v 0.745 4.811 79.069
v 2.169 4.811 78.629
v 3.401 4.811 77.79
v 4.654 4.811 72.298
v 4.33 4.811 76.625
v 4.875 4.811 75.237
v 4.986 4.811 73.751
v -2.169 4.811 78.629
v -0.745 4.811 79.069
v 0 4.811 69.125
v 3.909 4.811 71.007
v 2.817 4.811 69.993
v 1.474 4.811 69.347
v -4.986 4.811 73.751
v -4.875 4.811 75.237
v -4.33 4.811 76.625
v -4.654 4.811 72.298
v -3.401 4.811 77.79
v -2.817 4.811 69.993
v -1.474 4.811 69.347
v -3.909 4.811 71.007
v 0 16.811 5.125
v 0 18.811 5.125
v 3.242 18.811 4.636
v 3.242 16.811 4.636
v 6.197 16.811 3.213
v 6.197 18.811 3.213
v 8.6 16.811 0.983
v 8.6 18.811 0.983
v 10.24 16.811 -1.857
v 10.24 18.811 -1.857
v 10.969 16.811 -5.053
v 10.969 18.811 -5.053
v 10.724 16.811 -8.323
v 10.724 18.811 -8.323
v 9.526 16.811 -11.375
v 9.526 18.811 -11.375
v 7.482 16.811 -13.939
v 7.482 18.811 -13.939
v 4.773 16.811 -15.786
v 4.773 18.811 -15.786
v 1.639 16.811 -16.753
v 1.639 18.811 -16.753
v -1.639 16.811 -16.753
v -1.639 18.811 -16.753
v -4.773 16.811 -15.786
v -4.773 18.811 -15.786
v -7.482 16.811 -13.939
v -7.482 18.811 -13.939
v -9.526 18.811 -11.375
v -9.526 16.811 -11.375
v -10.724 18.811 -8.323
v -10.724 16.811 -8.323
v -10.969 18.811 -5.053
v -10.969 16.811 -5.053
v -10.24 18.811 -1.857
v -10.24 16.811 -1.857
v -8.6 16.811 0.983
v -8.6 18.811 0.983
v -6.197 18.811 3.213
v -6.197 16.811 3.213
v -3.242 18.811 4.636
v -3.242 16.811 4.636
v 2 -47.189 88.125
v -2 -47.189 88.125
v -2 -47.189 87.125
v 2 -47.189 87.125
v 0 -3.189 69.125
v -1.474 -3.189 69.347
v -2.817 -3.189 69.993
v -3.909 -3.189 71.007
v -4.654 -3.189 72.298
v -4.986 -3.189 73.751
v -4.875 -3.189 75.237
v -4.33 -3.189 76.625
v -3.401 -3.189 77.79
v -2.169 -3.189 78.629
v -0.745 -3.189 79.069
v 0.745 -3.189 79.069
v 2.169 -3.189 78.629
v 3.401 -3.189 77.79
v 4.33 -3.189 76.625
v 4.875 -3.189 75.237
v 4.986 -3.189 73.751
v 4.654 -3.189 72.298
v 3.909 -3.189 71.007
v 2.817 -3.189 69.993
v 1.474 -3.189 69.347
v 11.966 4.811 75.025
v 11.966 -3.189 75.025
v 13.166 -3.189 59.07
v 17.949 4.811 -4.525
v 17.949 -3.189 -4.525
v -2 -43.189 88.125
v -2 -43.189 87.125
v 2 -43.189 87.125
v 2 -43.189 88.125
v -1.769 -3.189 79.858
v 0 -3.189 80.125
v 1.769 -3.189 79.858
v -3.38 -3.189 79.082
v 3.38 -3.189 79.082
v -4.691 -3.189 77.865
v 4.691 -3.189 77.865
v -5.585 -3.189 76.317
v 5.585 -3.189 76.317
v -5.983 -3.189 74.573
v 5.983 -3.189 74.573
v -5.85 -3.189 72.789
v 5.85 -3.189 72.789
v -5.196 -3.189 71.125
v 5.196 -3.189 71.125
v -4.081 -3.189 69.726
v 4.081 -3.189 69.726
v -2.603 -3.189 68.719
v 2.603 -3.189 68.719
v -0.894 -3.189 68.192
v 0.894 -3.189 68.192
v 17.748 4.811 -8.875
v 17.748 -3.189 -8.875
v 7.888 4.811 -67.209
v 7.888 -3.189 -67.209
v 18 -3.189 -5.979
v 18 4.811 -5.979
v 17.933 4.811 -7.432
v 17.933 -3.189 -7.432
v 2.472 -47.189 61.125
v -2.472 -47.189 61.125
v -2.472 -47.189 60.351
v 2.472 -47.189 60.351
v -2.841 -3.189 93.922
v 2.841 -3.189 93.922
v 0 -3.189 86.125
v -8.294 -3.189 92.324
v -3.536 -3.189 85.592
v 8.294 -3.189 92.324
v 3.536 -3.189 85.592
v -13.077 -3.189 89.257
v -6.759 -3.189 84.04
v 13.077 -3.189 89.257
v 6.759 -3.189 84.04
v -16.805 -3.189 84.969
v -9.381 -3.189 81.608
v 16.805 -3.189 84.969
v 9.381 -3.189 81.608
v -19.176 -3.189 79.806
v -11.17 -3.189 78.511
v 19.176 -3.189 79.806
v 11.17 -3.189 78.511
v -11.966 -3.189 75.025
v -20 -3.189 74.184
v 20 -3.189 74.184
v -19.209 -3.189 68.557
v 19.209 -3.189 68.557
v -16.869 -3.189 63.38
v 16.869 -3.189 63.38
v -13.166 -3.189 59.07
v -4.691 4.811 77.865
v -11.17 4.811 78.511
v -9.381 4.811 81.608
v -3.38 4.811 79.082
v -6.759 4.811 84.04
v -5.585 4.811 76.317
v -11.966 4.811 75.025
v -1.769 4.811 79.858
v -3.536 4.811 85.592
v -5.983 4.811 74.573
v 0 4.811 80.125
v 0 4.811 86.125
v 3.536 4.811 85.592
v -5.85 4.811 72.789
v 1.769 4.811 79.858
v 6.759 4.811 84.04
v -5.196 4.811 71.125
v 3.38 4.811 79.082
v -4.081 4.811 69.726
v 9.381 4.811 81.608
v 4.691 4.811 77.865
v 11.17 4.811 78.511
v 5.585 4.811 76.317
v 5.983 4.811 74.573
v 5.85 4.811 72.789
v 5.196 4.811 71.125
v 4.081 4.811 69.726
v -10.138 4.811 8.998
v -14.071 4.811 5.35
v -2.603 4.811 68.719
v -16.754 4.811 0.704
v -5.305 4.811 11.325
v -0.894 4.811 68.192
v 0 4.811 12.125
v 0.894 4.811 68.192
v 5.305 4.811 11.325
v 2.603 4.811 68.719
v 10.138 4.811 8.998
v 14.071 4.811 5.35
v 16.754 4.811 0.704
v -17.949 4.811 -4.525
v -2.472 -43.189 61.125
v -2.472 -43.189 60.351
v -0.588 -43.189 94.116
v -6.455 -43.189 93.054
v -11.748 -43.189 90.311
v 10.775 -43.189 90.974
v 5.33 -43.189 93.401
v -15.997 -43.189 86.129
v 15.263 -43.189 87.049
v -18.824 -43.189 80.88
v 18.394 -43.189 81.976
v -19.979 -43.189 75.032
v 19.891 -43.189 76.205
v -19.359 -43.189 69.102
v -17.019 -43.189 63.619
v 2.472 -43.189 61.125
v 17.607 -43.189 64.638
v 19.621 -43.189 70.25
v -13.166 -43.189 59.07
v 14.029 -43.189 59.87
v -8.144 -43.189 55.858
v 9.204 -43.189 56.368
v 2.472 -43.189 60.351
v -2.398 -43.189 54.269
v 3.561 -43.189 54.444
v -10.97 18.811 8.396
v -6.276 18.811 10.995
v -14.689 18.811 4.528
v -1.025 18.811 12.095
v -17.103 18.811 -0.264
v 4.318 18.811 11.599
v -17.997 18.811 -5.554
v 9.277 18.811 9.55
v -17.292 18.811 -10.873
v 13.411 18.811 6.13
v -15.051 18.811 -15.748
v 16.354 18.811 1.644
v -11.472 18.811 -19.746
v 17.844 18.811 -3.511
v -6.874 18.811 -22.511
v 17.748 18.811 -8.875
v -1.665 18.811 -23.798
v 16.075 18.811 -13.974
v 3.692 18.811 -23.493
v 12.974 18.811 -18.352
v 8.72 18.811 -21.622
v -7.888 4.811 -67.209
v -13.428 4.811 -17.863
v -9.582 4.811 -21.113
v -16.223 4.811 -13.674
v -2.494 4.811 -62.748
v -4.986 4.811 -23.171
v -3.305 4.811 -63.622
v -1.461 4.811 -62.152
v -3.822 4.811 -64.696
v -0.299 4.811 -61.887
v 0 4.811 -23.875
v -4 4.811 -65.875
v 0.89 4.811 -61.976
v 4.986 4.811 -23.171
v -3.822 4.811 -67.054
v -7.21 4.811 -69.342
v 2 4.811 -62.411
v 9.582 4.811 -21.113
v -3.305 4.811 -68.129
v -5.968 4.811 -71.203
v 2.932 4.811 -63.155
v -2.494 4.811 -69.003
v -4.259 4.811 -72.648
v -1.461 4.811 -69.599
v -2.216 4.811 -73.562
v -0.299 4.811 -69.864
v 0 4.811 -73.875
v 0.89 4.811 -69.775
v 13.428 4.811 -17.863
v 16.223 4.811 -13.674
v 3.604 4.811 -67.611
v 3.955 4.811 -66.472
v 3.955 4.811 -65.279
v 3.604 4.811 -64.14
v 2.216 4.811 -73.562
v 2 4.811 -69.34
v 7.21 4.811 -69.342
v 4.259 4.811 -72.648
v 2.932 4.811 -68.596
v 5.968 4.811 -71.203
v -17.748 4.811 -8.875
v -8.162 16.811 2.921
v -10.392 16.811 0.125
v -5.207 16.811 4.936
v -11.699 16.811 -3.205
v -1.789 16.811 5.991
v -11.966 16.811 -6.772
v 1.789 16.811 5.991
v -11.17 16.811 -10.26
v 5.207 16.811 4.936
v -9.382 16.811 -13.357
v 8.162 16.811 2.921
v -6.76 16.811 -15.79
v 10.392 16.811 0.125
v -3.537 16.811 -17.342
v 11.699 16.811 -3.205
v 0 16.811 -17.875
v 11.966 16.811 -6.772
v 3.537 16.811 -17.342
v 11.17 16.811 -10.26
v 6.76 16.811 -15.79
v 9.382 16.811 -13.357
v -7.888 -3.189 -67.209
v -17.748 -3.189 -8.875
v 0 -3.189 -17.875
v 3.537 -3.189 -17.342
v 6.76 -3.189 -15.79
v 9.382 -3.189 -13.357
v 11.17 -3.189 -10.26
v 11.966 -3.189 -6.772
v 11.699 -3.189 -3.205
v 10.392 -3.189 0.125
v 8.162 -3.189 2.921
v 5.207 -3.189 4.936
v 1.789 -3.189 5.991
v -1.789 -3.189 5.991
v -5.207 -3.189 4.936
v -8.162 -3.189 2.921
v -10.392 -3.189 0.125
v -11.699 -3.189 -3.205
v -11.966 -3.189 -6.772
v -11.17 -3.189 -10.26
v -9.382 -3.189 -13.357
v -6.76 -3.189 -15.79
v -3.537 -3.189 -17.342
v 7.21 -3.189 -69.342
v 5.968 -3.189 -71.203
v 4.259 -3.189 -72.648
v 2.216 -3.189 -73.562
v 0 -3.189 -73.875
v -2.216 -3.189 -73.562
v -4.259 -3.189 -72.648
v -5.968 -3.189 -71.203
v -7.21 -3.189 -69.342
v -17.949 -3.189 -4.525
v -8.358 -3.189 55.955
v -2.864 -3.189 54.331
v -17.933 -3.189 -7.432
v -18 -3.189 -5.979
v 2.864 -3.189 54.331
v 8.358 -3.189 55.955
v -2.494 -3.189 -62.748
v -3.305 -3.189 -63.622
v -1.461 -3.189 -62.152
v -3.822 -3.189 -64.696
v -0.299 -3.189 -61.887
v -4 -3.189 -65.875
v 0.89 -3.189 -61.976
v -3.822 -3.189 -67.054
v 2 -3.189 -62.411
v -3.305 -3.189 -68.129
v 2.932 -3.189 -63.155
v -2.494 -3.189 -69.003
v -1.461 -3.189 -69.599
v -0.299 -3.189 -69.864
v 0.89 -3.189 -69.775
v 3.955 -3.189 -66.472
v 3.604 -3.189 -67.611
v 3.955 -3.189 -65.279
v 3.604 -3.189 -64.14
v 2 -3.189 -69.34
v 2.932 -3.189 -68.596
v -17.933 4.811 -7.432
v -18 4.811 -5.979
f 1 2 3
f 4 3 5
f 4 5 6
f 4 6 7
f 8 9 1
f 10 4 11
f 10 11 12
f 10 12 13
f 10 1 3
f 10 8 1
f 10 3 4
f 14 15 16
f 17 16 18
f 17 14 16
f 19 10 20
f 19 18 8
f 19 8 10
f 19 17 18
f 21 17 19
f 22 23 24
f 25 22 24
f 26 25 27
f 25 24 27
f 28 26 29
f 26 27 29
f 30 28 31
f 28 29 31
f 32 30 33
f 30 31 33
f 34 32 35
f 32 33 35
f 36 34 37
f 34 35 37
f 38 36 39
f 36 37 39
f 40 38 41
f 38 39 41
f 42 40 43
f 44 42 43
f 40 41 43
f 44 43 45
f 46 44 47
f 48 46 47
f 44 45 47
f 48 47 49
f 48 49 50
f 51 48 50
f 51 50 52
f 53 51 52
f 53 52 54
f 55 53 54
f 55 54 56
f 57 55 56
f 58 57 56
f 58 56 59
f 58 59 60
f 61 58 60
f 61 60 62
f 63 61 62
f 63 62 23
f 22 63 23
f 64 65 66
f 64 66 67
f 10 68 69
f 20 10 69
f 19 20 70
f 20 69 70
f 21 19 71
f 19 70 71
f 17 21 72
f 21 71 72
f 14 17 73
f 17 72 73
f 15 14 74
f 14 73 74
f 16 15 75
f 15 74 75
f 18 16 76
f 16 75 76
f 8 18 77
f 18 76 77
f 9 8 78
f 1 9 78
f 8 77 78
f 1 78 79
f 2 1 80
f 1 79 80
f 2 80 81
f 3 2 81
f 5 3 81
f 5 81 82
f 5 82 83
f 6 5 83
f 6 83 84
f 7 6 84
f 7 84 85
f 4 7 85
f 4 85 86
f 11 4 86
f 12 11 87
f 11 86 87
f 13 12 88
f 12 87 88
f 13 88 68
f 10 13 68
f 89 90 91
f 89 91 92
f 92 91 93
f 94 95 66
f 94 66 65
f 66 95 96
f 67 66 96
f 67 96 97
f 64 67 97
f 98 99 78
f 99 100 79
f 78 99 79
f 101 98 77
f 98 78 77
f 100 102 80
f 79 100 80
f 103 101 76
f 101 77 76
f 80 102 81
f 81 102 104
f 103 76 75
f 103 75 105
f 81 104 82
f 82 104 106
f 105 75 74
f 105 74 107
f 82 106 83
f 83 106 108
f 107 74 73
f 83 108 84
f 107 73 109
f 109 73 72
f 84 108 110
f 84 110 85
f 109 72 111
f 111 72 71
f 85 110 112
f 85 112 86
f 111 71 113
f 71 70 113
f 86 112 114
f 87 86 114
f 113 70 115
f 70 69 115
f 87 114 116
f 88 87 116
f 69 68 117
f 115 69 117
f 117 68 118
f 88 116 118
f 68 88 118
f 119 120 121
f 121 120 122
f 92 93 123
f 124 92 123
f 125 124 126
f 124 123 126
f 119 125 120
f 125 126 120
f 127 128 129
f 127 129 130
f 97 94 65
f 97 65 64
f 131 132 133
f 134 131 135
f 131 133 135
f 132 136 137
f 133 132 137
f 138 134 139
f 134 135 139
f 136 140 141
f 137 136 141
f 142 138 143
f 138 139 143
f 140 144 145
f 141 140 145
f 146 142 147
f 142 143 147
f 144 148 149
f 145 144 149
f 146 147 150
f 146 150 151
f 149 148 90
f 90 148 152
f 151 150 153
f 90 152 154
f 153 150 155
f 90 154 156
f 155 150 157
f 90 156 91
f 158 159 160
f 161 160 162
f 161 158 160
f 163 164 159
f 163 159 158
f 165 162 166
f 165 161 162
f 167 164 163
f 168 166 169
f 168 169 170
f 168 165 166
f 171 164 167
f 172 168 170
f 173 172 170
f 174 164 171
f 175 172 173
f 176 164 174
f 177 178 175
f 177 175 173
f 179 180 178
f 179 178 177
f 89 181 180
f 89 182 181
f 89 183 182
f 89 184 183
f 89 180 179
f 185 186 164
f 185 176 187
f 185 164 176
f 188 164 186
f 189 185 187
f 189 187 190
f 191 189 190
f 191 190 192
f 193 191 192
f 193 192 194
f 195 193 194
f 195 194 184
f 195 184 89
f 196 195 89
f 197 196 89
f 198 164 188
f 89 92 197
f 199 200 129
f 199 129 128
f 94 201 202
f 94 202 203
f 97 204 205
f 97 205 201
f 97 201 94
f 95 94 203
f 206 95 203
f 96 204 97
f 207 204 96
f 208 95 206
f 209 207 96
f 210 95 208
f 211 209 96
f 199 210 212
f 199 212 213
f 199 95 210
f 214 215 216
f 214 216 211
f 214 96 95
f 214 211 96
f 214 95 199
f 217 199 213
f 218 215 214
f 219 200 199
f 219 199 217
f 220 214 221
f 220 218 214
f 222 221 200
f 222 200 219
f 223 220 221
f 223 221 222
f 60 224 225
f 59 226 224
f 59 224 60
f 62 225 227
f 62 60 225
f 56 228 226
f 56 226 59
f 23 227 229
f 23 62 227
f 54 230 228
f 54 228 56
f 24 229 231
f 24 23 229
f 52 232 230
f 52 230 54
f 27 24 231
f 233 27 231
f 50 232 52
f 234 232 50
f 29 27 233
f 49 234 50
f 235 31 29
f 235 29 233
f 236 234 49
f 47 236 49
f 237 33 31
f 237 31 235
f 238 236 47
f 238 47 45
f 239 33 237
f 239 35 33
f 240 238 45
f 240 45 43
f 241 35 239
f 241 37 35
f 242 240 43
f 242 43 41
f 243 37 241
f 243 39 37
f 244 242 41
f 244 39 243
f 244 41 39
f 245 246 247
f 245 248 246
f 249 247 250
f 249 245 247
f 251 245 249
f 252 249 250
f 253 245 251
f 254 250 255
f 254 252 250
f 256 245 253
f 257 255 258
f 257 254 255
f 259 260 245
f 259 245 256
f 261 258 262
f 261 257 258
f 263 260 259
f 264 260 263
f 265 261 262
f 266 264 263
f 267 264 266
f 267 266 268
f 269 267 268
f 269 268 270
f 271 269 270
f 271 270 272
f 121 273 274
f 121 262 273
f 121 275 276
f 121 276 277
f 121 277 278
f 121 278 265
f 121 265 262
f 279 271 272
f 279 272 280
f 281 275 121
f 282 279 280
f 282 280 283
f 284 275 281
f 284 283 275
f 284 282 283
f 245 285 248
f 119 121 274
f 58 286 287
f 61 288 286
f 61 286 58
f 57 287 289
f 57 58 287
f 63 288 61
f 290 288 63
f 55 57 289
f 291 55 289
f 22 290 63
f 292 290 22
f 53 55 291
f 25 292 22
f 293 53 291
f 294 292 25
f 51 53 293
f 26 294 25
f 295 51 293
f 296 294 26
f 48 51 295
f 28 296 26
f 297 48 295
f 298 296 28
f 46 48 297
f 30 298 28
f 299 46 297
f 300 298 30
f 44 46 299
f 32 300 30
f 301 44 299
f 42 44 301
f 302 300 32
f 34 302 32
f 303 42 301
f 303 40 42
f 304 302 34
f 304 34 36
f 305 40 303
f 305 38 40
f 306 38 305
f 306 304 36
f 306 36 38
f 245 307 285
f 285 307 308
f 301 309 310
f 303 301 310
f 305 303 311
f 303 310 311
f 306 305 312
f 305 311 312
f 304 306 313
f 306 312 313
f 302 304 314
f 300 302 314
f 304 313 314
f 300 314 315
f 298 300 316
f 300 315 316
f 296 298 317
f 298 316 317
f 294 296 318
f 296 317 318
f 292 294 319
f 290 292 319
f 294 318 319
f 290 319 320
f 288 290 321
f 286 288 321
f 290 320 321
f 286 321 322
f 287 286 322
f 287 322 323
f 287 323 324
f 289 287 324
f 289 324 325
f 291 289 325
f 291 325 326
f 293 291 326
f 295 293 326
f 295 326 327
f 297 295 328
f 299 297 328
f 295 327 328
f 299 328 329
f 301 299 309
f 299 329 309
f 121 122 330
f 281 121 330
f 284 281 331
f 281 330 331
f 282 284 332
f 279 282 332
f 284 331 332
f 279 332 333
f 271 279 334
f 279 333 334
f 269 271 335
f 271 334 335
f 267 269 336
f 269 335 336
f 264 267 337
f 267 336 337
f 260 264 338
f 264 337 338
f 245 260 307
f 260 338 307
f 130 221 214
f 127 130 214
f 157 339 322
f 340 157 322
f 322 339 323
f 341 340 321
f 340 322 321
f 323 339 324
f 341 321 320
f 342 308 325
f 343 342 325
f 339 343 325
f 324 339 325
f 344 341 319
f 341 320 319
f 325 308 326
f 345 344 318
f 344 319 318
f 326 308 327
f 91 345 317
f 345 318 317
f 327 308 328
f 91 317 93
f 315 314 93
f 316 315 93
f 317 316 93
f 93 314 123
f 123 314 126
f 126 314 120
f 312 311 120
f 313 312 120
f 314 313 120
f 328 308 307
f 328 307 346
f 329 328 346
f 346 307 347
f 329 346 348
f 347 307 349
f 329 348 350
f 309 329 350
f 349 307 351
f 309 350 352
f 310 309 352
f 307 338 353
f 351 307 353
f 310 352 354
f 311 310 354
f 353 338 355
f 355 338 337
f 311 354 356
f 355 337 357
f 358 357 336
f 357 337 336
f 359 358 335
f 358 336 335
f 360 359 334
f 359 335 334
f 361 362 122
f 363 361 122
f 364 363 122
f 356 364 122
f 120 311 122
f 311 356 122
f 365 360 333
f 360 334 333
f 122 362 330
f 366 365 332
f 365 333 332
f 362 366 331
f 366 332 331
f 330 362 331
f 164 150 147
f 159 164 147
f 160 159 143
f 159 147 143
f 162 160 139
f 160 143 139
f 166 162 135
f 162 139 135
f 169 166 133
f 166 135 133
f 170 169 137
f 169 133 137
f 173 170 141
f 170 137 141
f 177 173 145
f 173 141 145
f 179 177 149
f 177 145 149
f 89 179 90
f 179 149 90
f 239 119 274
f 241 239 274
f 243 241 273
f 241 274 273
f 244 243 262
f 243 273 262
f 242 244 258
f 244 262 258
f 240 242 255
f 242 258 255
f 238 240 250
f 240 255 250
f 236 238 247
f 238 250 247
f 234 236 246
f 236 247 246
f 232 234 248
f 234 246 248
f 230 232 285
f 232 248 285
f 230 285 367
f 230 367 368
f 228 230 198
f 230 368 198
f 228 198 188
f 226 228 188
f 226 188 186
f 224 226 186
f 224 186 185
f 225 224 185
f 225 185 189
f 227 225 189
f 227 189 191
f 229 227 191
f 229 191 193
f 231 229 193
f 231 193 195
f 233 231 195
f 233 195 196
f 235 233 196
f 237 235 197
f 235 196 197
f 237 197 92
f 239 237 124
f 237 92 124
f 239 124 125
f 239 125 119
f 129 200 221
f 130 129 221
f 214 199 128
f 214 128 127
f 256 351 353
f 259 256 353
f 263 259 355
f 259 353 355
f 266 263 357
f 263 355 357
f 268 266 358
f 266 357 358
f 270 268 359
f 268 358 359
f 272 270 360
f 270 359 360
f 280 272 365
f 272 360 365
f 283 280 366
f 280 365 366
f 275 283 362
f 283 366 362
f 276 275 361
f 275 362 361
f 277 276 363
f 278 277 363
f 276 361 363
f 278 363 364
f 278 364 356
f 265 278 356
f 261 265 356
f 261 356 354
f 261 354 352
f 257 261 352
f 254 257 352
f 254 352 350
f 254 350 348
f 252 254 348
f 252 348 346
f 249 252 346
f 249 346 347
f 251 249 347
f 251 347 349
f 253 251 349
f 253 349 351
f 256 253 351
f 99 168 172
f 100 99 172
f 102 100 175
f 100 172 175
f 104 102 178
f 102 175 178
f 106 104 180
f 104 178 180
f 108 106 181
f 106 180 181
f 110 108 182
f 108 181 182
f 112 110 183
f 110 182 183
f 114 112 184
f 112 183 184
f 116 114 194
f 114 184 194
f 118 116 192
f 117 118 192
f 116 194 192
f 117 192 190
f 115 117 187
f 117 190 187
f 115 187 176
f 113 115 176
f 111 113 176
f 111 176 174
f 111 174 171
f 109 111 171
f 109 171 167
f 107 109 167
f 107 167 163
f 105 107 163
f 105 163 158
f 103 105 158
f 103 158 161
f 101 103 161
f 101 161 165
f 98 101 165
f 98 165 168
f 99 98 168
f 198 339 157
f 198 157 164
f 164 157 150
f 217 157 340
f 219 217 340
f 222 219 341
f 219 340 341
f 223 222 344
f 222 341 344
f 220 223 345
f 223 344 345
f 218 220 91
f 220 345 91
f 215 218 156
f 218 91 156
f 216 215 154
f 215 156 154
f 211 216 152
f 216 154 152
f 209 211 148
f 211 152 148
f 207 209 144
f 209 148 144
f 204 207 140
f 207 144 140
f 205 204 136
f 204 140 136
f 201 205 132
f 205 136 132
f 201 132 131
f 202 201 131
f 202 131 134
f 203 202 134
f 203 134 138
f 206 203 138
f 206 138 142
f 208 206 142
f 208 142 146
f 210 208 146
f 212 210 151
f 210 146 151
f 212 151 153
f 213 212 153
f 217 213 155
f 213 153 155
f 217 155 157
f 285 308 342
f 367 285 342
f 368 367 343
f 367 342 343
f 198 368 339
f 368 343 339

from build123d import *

# Parameters (mm, degrees)
EXTRUDE_1_DEPTH       = 4
SKETCH_3_R            = 9
EXTRUDE_2_DEPTH       = 7
SKETCH_4_R            = 3
CUT_EXTRUDE_1_DEPTH   = 48.391982444
SKETCH_5_R            = 6
CUT_EXTRUDE_2_DEPTH   = 10
SKETCH_7_R            = 5.5
CUT_EXTRUDE_3_DEPTH   = 49.145612469
HOLE_WIZARD_4_0_4_1_D = 4
SCALE1_SCALE          = 2
SKETCH1_R             = 20
EXTRUDE1_DEPTH        = 40
SKETCH2_R             = 5
EXTRUDE2_DEPTH        = 8
SKETCH3_W             = 4
SKETCH3_H             = 1
SKETCH3_W_2           = 4.944968004
SKETCH3_H_2           = 0.773994992
EXTRUDE3_DEPTH        = 4


with BuildPart() as part:
    # 草图1 → 凸台-拉伸1 (new body)
    with BuildSketch(Plane(origin=(0, 0, 0), x_dir=(1, 0, 0), z_dir=(0, 1, 0))):
        with BuildLine():
            Line((-8.974651804, -0.675), (-5.983101203, -40.45))
            ThreePointArc((-5.983101203, -40.45), (0, -46), (5.983101203, -40.45))
            Line((5.983101203, -40.45), (8.974651804, -0.675))
            ThreePointArc((8.974651804, -0.675), (8.990401386, 0.415551353), (8.874119675, 1.5))
            Line((8.874119675, 1.5), (3.944053189, 30.666666667))
            ThreePointArc((3.944053189, 30.666666667), (0, 34), (-3.944053189, 30.666666667))
            Line((-3.944053189, 30.666666667), (-8.874119675, 1.5))
            ThreePointArc((-8.874119675, 1.5), (-8.990401386, 0.415551353), (-8.974651804, -0.675))
        make_face()
    extrude(amount=EXTRUDE_1_DEPTH)

    # 草图3 → 凸台-拉伸2 (add)
    with BuildSketch(Plane(origin=(0, 4, 0), x_dir=(1, 0, 0), z_dir=(0, 1, 0))):
        with Locations(Location((0, 0, 0), (0, 0, 9.594068227))):
            Circle(SKETCH_3_R)
    extrude(amount=EXTRUDE_2_DEPTH)

    # 草图4 → 切除-拉伸1 (cut, through all)
    with BuildSketch(Plane(origin=(0, 4, 0), x_dir=(1, 0, 0), z_dir=(0, 1, 0))):
        with Locations(Location((0, -40, 0), (0, 0, 270))):
            Circle(SKETCH_4_R)
    extrude(amount=-CUT_EXTRUDE_1_DEPTH, mode=Mode.SUBTRACT)

    # 草图5 → 切除-拉伸2 (cut)
    with BuildSketch(Plane.XZ):
        with Locations(Location((0, 0, 0), (0, 0, 270))):
            Circle(SKETCH_5_R)
    extrude(amount=-CUT_EXTRUDE_2_DEPTH, mode=Mode.SUBTRACT)

    # 草图7 → 切除-拉伸3 (cut, through all)
    with BuildSketch(Plane(origin=(0, 11, 0), x_dir=(1, 0, 0), z_dir=(0, 1, 0))):
        with Locations(Location((0, 0, 0), (0, 0, 270))):
            Circle(SKETCH_7_R)
    extrude(amount=-CUT_EXTRUDE_3_DEPTH, mode=Mode.SUBTRACT)

    # Ø4.0 (4) 直径孔1 (through all)
    with Locations(Plane(origin=(0, 4, 0), x_dir=(1, 0, 0), z_dir=(0, 1, 0))):
        with Locations((0, 30)):
            Hole(HOLE_WIZARD_4_0_4_1_D / 2)


with BuildPart() as part_1:
    # Scale1: scaled about (0, 3.188915264, 5.875445323)
    add(part.part.scale(SCALE1_SCALE).moved(Location((0, -3.188915264, -5.875445323))))

    # Sketch1 → Extrude1 (add)
    with BuildSketch(Plane.XZ.offset(3.188915264)):
        with Locations(Location((0, 74.124554677, 0), (0, 0, 228.828880049))):
            Circle(SKETCH1_R)
    extrude(amount=EXTRUDE1_DEPTH)

    # Sketch2 → Extrude2 (add)
    with BuildSketch(Plane(origin=(0, -3.188915264, 0), x_dir=(1, 0, 0), z_dir=(0, 1, 0))):
        with Locations(Location((0, -74.124554677, 0), (0, 0, 90))):
            Circle(SKETCH2_R)
    extrude(amount=EXTRUDE2_DEPTH)

    # Sketch3 → Extrude3 (add)
    with BuildSketch(Plane.XZ.offset(43.188915264)):
        with Locations((0, 87.624554677)):
            Rectangle(SKETCH3_W, SKETCH3_H)
        with Locations((0, 60.737557181)):
            Rectangle(SKETCH3_W_2, SKETCH3_H_2)
    extrude(amount=EXTRUDE3_DEPTH)


solid = part_1.part
